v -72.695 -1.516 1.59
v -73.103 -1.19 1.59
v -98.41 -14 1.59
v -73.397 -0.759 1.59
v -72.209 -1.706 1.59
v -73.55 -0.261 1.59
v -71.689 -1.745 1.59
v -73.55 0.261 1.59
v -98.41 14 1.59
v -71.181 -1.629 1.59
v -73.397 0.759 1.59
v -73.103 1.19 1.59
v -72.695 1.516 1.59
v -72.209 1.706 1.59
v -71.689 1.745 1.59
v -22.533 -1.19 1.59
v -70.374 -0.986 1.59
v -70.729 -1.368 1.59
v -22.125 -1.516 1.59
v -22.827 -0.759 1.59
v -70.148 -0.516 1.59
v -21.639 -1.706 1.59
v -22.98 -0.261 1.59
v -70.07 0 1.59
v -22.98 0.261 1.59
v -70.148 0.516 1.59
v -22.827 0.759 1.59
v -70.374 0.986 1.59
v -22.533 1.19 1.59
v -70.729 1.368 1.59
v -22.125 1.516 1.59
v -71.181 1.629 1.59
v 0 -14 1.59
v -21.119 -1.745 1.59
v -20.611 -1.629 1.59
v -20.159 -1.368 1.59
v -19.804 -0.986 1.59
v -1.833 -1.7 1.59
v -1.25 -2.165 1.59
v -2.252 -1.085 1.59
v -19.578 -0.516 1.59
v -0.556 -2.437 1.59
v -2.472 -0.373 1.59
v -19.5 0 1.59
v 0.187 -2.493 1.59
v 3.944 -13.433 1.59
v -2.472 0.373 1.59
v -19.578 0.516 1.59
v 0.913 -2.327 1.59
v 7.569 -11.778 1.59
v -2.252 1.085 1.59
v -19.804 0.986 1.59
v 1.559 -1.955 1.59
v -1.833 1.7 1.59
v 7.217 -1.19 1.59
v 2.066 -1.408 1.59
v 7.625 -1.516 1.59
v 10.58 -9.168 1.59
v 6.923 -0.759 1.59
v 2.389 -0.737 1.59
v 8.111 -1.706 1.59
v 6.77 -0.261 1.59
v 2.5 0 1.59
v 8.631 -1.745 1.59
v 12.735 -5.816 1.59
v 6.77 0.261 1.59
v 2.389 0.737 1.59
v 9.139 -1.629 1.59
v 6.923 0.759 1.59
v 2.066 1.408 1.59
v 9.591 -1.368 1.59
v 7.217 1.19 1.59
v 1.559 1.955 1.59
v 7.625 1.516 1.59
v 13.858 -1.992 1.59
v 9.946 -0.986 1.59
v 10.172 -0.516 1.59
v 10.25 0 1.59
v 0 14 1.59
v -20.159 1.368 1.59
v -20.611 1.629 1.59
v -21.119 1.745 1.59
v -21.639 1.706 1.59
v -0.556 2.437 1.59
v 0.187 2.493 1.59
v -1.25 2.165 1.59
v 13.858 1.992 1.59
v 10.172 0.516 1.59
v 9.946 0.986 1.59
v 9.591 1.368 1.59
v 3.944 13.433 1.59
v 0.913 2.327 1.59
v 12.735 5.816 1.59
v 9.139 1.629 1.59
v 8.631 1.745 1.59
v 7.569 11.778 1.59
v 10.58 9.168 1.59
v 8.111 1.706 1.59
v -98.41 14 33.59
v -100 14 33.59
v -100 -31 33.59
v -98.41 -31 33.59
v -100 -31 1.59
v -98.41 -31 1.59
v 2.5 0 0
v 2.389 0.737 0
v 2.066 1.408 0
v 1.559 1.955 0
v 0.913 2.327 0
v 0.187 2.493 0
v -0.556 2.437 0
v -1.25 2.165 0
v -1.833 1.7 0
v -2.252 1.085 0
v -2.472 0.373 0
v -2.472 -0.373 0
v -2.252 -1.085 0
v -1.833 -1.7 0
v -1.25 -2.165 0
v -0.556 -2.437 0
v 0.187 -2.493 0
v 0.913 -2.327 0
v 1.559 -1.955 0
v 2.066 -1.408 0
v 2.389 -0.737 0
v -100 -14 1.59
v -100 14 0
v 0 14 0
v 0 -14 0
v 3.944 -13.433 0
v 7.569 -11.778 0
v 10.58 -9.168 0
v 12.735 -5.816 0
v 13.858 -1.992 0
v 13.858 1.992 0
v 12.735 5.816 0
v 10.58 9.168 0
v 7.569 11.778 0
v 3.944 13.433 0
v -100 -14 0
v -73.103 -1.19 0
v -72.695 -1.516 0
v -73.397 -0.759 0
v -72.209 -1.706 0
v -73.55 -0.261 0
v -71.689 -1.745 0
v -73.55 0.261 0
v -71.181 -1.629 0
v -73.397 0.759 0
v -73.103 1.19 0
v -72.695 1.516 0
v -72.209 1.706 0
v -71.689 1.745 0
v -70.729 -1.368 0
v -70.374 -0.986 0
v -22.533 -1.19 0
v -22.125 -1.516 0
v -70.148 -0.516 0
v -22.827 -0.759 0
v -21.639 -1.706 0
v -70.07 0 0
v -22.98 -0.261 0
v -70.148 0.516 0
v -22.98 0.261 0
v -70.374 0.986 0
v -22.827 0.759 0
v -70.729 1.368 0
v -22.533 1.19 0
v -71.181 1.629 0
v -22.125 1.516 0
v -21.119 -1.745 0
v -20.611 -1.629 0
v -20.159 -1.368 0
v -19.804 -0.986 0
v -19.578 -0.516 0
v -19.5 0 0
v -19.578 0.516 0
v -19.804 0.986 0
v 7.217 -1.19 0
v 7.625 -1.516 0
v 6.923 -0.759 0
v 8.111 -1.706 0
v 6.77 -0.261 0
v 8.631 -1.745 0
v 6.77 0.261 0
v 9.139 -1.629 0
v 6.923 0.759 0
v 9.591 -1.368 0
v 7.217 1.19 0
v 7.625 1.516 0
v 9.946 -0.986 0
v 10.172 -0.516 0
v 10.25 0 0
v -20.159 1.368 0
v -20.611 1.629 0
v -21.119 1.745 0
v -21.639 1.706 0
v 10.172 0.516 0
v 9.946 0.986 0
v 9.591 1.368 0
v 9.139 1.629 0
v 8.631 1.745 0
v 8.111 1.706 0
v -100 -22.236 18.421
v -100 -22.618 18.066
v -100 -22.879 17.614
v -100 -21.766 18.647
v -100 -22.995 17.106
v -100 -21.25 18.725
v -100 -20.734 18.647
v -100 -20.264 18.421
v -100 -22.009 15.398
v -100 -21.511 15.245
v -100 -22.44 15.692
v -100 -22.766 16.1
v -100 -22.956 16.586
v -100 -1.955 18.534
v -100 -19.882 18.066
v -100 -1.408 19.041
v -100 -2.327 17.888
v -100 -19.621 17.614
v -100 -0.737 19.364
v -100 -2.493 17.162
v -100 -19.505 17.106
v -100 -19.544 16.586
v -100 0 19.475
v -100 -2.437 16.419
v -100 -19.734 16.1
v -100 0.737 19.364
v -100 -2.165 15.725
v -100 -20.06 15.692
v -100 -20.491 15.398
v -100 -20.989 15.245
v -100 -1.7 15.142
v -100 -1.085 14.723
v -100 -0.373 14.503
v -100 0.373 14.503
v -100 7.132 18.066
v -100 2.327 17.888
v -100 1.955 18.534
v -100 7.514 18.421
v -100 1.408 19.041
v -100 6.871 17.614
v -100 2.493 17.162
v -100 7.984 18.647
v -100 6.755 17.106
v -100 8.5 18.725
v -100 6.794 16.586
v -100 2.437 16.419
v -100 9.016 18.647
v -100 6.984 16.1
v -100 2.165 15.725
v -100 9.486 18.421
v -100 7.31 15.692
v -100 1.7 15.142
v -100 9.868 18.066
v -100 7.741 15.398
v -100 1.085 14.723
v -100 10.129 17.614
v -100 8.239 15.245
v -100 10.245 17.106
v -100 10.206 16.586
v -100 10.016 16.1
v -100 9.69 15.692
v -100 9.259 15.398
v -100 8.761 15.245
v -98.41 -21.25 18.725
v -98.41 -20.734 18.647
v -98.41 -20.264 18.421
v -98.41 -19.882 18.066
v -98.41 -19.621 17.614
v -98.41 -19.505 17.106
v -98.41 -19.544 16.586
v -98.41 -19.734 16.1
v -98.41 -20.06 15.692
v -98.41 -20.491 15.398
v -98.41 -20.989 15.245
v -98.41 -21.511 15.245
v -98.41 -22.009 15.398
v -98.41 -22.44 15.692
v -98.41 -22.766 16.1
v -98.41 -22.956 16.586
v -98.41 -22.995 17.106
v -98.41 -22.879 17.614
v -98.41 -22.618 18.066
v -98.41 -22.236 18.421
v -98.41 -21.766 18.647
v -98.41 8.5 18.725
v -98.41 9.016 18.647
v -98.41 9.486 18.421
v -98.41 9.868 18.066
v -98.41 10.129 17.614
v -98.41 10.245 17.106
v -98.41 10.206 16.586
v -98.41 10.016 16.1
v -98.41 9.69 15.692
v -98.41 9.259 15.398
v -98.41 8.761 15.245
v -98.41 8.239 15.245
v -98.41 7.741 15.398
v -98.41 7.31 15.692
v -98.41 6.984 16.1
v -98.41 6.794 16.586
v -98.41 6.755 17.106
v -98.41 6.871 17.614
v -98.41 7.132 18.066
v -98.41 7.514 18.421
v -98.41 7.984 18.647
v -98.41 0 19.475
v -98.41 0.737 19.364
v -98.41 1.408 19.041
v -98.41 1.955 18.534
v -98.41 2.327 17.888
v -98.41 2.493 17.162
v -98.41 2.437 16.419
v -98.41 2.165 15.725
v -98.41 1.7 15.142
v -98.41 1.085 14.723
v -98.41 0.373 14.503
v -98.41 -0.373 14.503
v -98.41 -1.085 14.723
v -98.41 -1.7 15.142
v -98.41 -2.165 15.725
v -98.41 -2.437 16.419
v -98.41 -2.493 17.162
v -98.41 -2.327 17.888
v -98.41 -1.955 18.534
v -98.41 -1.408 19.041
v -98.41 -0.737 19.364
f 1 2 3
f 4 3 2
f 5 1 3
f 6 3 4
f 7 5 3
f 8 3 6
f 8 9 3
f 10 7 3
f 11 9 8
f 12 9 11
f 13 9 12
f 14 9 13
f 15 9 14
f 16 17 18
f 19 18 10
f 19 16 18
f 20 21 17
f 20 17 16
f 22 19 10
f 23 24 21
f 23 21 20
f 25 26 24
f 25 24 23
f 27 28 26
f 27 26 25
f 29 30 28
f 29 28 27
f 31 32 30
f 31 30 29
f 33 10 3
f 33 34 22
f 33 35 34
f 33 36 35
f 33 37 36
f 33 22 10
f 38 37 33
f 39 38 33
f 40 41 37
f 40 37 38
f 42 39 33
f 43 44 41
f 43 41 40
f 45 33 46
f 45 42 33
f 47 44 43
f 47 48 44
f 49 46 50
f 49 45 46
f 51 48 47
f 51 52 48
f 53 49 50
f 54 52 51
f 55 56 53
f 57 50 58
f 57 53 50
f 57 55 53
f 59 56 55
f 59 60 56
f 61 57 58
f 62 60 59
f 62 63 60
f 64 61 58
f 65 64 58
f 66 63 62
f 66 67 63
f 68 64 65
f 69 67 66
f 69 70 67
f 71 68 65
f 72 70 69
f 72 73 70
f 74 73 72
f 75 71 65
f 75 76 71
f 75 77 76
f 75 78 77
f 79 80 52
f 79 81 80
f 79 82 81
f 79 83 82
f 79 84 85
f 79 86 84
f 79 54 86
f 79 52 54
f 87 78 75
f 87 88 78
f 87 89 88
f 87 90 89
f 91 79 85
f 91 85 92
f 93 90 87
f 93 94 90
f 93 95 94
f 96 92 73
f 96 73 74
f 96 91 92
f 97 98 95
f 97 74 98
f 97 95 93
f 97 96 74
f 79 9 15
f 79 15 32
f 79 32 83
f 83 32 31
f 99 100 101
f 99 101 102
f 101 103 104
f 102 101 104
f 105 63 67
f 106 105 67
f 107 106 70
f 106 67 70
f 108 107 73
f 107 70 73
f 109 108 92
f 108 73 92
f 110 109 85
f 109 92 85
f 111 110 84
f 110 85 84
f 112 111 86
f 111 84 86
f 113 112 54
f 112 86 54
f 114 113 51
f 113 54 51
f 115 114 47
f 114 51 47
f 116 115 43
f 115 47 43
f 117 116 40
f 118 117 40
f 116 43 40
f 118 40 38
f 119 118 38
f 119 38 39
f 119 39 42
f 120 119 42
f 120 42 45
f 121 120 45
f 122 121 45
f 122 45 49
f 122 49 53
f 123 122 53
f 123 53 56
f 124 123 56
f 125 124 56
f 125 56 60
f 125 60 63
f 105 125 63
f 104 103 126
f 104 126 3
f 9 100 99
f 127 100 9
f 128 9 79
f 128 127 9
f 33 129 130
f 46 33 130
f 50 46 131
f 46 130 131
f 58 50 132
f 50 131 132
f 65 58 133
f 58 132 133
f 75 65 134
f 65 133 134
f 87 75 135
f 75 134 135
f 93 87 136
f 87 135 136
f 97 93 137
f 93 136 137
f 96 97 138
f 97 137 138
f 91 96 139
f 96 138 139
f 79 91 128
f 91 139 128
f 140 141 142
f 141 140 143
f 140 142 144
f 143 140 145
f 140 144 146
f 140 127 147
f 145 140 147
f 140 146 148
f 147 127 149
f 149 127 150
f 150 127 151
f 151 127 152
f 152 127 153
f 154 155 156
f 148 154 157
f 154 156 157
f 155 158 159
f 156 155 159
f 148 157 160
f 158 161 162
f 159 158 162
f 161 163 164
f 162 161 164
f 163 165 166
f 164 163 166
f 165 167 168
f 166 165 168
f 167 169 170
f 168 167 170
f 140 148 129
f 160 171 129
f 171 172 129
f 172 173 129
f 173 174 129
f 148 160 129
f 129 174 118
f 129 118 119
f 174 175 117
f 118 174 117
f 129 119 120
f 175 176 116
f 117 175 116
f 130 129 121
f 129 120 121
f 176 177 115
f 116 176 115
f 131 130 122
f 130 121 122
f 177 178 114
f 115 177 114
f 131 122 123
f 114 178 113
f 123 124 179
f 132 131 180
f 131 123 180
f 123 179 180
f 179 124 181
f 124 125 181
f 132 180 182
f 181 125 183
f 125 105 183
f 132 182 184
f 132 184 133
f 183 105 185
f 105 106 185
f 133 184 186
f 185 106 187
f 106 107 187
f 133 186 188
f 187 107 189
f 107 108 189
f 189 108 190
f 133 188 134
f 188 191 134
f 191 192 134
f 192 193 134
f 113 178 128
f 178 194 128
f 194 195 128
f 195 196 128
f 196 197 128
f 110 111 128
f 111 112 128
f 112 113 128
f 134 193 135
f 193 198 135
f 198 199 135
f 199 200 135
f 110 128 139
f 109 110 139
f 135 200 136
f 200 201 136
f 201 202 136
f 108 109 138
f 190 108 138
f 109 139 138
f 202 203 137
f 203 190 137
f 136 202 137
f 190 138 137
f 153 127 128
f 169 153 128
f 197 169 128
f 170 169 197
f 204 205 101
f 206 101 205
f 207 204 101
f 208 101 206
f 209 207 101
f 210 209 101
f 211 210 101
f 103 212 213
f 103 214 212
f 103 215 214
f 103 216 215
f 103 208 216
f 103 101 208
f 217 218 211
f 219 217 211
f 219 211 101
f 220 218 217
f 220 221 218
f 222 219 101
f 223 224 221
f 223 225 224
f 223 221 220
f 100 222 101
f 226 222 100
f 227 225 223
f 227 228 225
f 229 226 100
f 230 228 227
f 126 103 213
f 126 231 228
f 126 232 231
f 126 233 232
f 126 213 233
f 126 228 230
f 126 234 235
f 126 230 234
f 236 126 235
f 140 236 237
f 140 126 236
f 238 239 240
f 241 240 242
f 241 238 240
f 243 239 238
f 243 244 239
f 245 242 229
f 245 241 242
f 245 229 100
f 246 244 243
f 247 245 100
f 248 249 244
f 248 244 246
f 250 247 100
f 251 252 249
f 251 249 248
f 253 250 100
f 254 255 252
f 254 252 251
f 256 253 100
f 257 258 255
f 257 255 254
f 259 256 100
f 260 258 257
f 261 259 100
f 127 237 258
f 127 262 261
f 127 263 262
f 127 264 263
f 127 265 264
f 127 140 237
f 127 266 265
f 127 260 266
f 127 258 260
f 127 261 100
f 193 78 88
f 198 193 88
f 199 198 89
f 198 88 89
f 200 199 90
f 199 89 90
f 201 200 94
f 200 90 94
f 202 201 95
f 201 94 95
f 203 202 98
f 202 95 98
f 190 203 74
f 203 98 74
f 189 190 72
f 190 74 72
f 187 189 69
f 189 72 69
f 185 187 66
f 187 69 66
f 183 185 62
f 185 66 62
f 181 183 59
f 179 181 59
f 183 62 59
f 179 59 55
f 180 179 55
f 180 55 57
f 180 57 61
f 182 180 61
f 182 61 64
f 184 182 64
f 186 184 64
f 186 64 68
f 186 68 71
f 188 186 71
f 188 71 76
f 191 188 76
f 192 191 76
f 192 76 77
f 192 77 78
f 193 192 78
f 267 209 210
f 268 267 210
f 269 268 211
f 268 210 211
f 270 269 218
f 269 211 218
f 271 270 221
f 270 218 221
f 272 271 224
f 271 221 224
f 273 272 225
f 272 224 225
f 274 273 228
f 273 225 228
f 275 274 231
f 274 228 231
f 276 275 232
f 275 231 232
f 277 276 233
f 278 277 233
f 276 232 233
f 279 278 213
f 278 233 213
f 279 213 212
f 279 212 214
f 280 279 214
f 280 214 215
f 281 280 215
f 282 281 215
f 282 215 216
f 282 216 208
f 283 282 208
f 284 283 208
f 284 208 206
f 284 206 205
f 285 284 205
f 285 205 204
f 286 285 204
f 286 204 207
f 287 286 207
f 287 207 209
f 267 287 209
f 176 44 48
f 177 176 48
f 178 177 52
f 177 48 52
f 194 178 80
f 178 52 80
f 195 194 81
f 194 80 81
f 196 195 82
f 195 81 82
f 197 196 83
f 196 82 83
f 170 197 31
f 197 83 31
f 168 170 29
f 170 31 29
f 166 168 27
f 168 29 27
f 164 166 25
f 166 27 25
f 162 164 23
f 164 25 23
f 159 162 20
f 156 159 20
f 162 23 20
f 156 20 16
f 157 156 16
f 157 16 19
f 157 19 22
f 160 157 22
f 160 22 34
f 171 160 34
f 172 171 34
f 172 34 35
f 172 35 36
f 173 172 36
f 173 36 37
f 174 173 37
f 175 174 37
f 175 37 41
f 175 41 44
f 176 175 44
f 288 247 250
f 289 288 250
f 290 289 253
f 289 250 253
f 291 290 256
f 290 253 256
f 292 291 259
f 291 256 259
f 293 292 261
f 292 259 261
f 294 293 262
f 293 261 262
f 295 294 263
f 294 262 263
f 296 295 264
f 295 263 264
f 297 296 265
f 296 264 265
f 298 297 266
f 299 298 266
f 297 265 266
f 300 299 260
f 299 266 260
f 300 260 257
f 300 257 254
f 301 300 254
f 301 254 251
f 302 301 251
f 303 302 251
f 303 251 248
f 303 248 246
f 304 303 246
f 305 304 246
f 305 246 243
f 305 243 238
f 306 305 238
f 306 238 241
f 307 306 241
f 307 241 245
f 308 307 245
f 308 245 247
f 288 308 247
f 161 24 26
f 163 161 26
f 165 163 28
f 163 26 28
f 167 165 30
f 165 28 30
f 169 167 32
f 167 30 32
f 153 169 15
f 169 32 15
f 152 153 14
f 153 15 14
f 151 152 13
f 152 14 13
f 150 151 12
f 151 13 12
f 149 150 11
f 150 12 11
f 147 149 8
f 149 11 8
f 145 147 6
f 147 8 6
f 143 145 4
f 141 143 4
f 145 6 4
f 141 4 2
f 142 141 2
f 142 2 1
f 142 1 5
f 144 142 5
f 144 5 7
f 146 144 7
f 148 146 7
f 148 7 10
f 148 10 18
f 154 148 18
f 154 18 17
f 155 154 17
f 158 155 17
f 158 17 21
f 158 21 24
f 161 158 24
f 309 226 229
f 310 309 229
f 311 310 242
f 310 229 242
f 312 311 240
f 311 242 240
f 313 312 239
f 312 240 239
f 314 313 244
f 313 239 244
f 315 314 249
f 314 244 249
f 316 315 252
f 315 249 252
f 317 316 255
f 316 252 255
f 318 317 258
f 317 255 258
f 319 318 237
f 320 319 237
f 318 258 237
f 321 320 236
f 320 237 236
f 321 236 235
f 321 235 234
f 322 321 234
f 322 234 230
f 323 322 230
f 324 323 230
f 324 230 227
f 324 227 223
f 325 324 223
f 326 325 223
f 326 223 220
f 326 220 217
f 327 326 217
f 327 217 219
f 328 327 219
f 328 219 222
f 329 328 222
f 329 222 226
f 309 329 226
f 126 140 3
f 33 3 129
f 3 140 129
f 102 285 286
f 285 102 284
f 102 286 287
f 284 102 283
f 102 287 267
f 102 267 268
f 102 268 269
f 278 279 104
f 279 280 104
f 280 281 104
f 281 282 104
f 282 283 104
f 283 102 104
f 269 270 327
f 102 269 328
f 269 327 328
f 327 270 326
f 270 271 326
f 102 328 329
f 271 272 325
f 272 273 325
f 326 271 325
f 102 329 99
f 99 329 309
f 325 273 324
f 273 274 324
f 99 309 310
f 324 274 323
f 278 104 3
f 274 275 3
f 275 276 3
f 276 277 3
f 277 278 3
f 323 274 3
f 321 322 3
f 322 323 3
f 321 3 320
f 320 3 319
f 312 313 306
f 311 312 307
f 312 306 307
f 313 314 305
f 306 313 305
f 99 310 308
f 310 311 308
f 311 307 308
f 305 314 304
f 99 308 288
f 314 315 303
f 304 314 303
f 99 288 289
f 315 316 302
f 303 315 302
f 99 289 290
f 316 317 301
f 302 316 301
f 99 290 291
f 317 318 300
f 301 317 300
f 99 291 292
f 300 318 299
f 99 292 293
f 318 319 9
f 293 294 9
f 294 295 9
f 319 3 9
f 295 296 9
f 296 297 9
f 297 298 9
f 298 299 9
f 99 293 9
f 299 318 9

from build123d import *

# Parameters (mm, degrees)
BOSS_EXTRUDE1_DEPTH = 1.59
SKETCH2_W           = 1.59
SKETCH2_H           = 45
BOSS_EXTRUDE2_DEPTH = 32
SKETCH3_R           = 2.5
SKETCH3_R_2         = 1.75
CUT_EXTRUDE1_DEPTH  = 110.476024773
SKETCH4_R           = 2.5
SKETCH4_R_2         = 1.75
CUT_EXTRUDE2_DEPTH  = 123.822180814


with BuildPart() as part:
    # Sketch1 → Boss-Extrude1 (new body)
    with BuildSketch(Plane.XY):
        with BuildLine():
            Line((0, 14), (-100, 14))
            Line((-100, 14), (-100, -14))
            Line((-100, -14), (0, -14))
            ThreePointArc((0, -14), (14, 0), (0, 14))
        make_face()
    extrude(amount=BOSS_EXTRUDE1_DEPTH)

    # Sketch2 → Boss-Extrude2 (add)
    with BuildSketch(Plane.XY.offset(1.59)):
        with Locations((-99.205, -8.5)):
            Rectangle(SKETCH2_W, SKETCH2_H)
    extrude(amount=BOSS_EXTRUDE2_DEPTH)

    # Sketch3 → Cut-Extrude1 (cut, through all)
    with BuildSketch(Plane.XY.offset(1.59)):
        Circle(SKETCH3_R)
        with Locations((8.5, 0)):
            Circle(SKETCH3_R_2)
        with Locations((-21.25, 0)):
            Circle(SKETCH3_R_2)
        with Locations((-71.82, 0)):
            Circle(SKETCH3_R_2)
    extrude(amount=-CUT_EXTRUDE1_DEPTH, mode=Mode.SUBTRACT)

    # Sketch4 → Cut-Extrude2 (cut, through all)
    with BuildSketch(Plane.ZY.offset(100)):
        with Locations((16.975, 0)):
            Circle(SKETCH4_R)
        with Locations((16.975, 8.5)):
            Circle(SKETCH4_R_2)
        with Locations((16.975, -21.25)):
            Circle(SKETCH4_R_2)
    extrude(amount=-CUT_EXTRUDE2_DEPTH, mode=Mode.SUBTRACT)


solid = part.part
